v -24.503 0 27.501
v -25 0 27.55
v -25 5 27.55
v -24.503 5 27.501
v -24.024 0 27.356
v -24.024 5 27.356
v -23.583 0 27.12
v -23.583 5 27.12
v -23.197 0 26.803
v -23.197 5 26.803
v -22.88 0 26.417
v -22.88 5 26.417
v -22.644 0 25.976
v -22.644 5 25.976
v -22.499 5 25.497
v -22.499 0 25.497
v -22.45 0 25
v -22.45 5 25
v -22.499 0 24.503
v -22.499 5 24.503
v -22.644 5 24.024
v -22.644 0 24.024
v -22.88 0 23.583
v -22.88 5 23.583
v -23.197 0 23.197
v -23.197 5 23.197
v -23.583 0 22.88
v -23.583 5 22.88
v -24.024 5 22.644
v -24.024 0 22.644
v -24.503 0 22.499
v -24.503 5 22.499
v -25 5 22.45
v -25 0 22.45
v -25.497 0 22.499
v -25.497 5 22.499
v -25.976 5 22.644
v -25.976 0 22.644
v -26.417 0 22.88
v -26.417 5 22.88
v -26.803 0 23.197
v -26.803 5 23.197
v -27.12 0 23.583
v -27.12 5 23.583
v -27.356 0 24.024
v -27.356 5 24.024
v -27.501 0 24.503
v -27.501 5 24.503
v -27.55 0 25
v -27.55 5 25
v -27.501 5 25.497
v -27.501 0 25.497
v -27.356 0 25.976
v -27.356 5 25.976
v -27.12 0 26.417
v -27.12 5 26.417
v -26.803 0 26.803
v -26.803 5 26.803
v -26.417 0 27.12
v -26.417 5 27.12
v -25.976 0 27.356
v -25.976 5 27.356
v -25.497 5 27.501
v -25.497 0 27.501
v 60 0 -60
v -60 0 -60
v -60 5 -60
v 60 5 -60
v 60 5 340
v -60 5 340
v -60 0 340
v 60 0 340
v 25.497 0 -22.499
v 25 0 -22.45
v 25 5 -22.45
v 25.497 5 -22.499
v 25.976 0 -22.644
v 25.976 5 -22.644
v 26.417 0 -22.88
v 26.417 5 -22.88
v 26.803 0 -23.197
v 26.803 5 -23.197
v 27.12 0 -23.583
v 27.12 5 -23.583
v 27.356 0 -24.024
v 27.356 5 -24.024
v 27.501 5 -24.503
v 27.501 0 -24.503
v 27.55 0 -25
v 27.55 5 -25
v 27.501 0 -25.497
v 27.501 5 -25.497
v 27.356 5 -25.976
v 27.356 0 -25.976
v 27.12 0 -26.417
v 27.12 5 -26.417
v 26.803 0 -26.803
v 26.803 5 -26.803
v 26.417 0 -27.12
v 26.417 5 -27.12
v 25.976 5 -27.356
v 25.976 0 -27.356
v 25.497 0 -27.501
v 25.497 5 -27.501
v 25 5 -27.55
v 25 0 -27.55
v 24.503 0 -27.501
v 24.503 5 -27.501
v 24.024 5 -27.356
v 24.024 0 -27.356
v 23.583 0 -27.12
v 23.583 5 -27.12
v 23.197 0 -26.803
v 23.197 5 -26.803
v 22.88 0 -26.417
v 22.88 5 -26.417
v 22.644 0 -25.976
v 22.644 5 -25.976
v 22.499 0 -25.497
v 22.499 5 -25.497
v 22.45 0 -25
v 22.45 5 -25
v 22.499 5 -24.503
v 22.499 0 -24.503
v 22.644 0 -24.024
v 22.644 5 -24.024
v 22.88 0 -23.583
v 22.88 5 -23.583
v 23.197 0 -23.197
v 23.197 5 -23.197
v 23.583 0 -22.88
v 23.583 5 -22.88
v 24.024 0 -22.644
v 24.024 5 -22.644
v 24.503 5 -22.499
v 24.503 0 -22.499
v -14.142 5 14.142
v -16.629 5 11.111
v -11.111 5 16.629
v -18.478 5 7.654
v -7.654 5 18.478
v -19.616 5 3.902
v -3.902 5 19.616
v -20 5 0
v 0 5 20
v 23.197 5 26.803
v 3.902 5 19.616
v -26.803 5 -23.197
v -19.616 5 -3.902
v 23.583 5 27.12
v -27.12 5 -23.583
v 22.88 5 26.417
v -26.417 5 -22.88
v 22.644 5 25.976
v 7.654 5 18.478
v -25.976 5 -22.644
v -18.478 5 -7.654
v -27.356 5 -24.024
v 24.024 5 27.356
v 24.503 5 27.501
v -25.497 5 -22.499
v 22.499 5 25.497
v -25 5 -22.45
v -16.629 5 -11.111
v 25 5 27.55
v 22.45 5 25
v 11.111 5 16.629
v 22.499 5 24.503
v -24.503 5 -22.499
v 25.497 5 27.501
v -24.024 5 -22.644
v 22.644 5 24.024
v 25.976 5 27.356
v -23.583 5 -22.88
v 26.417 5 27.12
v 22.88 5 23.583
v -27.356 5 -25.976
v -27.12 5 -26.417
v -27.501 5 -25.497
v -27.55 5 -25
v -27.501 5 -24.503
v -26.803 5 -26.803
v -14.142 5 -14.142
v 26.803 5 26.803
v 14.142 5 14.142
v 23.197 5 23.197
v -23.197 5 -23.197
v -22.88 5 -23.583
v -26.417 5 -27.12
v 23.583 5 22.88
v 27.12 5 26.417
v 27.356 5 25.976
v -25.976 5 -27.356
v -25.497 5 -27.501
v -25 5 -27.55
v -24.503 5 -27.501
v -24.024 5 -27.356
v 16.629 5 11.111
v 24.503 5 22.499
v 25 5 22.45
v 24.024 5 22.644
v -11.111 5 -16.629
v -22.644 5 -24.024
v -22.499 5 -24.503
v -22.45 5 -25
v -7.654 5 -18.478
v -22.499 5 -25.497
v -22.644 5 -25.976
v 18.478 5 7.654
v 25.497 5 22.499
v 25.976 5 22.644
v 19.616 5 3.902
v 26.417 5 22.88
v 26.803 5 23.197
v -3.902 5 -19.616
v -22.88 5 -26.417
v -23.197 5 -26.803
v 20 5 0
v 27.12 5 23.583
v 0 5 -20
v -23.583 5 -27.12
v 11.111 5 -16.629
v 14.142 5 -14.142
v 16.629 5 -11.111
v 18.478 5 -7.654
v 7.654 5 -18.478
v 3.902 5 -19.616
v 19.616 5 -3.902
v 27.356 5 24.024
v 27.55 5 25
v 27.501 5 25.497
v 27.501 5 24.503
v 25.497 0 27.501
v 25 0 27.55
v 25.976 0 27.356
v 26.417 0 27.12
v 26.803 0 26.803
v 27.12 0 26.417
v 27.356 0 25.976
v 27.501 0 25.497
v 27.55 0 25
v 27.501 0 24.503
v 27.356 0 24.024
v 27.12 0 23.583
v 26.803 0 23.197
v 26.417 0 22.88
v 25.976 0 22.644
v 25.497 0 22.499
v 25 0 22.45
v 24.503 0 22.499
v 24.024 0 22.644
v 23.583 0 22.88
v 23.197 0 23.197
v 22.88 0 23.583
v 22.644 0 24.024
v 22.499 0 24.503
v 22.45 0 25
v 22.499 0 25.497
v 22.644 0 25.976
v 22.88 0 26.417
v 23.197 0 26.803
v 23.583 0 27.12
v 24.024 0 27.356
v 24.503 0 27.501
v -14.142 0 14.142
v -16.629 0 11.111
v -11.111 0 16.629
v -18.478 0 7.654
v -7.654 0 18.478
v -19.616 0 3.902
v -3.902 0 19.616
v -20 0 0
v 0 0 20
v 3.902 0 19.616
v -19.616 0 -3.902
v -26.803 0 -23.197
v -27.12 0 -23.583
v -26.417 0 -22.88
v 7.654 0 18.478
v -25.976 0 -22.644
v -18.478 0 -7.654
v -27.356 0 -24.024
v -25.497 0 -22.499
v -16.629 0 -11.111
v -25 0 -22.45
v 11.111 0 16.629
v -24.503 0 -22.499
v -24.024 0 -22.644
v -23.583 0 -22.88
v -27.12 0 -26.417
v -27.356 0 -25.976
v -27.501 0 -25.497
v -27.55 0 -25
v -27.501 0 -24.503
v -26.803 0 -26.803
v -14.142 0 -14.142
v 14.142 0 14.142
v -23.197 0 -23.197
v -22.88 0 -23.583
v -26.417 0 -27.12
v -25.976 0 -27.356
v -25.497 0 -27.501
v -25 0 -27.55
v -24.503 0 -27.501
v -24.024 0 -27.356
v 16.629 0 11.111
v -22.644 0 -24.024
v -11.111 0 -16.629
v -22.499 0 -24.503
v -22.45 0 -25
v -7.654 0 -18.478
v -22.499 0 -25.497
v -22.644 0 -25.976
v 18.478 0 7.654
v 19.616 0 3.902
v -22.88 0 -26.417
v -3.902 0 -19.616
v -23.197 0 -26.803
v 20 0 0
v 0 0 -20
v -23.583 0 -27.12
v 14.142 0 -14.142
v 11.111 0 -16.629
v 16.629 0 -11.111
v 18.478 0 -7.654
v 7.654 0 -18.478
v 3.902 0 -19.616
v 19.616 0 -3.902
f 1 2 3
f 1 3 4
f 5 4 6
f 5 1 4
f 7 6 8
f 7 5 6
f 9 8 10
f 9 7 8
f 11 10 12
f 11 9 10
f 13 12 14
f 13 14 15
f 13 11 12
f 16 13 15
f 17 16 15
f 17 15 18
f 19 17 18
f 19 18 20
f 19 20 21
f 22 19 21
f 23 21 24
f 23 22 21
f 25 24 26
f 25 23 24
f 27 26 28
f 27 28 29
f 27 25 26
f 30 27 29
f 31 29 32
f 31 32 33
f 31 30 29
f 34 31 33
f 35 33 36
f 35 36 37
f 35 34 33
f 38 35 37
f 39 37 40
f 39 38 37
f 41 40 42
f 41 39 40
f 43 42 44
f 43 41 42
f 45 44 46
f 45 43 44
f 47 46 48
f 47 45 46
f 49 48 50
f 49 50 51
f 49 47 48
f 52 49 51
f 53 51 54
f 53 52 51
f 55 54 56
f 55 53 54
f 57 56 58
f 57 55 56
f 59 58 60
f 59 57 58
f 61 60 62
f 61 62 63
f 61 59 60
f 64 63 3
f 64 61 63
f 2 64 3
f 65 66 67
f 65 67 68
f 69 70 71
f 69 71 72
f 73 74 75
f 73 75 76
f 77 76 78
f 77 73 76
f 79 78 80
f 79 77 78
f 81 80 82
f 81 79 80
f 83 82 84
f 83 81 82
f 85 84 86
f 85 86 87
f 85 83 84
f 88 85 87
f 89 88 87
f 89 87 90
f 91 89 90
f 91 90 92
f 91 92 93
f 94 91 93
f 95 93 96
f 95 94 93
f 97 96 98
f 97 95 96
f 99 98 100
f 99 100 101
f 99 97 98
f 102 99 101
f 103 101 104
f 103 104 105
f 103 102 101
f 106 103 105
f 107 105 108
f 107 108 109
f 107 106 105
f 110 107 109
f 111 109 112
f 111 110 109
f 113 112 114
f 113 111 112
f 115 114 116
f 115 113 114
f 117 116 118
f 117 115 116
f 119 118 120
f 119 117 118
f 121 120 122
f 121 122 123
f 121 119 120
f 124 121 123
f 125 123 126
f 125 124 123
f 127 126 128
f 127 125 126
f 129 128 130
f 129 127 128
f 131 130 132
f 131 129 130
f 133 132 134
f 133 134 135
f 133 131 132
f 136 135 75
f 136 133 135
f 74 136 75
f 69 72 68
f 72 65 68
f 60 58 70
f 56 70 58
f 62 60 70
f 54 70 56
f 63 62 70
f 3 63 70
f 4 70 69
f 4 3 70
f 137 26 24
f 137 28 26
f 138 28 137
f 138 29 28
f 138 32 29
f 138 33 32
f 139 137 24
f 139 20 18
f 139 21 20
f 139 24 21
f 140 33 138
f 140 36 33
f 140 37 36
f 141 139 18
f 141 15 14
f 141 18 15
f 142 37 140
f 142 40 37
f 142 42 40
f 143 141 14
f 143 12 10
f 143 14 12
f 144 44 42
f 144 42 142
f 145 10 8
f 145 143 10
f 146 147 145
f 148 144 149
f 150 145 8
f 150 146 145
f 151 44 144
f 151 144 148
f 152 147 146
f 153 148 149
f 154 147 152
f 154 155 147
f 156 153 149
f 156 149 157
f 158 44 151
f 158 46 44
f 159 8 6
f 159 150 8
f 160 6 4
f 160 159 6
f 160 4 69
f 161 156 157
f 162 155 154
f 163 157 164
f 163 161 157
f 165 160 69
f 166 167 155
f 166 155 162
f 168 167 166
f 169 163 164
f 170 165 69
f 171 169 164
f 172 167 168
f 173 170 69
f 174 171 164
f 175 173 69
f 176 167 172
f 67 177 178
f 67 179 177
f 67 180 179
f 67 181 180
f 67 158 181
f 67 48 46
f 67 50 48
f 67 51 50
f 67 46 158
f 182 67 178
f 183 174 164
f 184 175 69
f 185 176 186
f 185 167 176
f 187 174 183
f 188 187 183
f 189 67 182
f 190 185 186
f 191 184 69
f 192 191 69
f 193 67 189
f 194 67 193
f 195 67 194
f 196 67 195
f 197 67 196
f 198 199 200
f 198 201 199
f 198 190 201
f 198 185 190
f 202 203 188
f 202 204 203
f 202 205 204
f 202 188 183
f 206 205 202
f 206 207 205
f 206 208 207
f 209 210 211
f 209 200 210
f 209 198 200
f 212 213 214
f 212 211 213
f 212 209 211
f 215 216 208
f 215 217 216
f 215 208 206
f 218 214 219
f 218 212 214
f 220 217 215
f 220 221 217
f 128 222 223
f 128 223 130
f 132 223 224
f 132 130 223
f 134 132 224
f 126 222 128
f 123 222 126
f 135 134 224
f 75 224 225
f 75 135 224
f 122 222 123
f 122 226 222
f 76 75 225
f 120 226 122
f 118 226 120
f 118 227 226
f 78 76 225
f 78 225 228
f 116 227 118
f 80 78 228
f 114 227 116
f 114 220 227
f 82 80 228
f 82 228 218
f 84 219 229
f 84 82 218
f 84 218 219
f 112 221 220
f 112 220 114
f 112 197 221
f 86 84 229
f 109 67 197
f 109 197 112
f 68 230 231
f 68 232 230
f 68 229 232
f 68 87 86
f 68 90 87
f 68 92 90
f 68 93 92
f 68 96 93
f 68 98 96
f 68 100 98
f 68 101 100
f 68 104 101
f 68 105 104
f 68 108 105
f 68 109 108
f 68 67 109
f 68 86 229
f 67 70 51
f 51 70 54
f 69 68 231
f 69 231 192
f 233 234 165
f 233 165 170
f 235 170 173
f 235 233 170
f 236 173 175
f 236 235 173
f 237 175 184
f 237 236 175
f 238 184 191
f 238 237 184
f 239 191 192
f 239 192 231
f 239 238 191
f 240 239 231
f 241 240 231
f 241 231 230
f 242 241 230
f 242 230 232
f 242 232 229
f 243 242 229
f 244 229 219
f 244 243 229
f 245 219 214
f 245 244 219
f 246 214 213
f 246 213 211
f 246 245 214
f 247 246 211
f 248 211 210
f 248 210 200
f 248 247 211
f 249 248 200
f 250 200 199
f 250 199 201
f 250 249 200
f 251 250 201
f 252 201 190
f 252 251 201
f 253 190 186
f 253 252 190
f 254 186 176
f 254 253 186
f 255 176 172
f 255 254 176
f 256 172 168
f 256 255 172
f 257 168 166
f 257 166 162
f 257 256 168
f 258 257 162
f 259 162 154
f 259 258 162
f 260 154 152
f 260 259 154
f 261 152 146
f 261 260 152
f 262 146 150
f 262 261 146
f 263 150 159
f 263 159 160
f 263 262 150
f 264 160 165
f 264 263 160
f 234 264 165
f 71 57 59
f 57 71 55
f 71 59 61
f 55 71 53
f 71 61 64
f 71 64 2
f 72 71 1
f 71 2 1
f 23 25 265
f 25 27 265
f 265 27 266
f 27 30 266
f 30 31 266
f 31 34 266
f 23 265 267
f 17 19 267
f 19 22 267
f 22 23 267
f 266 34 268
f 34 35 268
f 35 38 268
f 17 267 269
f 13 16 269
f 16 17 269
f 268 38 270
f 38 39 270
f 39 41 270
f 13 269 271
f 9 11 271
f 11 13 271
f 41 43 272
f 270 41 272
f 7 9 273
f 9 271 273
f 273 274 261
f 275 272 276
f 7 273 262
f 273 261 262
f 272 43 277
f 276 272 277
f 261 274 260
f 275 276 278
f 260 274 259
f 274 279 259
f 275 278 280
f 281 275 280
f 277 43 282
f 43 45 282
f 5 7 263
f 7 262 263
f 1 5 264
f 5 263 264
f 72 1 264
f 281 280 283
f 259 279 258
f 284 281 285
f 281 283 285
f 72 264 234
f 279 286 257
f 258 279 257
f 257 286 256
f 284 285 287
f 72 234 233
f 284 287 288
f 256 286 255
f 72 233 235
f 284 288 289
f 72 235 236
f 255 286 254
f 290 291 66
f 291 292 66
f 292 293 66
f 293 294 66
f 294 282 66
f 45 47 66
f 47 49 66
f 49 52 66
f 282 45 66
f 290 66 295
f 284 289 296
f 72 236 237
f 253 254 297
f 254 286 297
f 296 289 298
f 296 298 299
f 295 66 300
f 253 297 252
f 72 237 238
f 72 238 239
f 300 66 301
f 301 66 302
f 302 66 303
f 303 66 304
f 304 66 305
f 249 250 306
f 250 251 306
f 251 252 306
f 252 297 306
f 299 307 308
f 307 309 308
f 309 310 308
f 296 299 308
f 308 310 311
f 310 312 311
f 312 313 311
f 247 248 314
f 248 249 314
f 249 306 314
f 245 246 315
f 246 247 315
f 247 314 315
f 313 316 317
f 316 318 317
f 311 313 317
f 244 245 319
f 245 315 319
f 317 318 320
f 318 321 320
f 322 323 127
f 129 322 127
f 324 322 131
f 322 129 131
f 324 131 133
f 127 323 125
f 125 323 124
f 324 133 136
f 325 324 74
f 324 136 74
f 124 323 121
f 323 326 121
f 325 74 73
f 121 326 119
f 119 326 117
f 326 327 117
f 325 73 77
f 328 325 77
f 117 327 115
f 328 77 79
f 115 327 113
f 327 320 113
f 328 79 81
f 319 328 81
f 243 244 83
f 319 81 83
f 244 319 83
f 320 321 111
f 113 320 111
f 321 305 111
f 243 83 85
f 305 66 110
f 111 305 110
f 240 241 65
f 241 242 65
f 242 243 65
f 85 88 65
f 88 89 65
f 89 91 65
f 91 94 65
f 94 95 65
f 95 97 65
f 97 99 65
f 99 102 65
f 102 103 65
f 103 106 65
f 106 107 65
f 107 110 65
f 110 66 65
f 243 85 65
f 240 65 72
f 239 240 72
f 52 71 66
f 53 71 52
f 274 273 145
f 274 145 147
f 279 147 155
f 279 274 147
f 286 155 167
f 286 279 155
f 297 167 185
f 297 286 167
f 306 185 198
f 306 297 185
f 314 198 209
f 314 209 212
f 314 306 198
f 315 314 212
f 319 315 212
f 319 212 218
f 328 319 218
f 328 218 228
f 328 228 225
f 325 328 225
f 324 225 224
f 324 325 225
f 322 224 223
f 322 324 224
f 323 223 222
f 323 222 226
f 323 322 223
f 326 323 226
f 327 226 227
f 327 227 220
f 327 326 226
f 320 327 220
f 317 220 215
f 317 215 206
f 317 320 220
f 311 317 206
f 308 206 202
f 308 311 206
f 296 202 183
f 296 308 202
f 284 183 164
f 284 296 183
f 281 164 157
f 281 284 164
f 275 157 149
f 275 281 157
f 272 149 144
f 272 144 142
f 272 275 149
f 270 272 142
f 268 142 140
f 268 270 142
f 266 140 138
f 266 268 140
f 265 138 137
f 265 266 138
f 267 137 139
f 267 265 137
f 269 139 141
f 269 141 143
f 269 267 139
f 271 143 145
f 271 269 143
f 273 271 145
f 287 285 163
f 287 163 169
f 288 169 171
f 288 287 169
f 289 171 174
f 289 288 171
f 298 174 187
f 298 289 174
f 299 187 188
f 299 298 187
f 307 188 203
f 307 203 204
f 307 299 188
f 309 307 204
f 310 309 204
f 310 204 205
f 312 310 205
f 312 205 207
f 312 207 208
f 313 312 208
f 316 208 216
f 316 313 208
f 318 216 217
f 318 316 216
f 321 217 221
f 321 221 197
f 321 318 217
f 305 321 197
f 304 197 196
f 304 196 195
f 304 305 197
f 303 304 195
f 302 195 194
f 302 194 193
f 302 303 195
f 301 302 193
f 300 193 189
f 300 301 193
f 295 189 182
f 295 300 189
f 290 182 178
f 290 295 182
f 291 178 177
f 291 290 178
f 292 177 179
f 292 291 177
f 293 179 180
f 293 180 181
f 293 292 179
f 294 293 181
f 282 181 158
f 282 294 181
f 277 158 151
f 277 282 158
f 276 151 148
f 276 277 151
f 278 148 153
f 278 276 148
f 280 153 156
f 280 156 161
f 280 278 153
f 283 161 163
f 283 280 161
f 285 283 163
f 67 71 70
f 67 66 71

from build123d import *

# Parameters (mm, degrees)
SKETCH1_W           = 120
SKETCH1_H           = 120
SKETCH1_R           = 2.55
SKETCH1_R_2         = 20
BOSS_EXTRUDE1_DEPTH = 5
SKETCH2_W           = 120
SKETCH2_H           = 5
BOSS_EXTRUDE2_DEPTH = 280


with BuildPart() as part:
    # Sketch1 → Boss-Extrude1 (new body)
    with BuildSketch(Plane(origin=(0, 0, 0), x_dir=(1, 0, 0), z_dir=(0, 1, 0))):
        Rectangle(SKETCH1_W, SKETCH1_H)
        with Locations(Location((-25.000001015, -25.000001015, 0), (0, 0, 270))):
            Circle(SKETCH1_R, mode=Mode.SUBTRACT)
        with Locations(Location((24.999998985, -24.999998985, 0), (0, 0, 270))):
            Circle(SKETCH1_R, mode=Mode.SUBTRACT)
        with Locations(Location((25.000001015, 25.000001015, 0), (0, 0, 270))):
            Circle(SKETCH1_R, mode=Mode.SUBTRACT)
        with Locations(Location((-24.999998985, 24.999998985, 0), (0, 0, 270))):
            Circle(SKETCH1_R, mode=Mode.SUBTRACT)
        with Locations(Location((0, 0, 0), (0, 0, 270))):
            Circle(SKETCH1_R_2, mode=Mode.SUBTRACT)
    extrude(amount=BOSS_EXTRUDE1_DEPTH)

    # Sketch2 → Boss-Extrude2 (add)
    with BuildSketch(Plane.XY.offset(60)):
        with Locations((0, 2.5)):
            Rectangle(SKETCH2_W, SKETCH2_H)
    extrude(amount=BOSS_EXTRUDE2_DEPTH)


solid = part.part
